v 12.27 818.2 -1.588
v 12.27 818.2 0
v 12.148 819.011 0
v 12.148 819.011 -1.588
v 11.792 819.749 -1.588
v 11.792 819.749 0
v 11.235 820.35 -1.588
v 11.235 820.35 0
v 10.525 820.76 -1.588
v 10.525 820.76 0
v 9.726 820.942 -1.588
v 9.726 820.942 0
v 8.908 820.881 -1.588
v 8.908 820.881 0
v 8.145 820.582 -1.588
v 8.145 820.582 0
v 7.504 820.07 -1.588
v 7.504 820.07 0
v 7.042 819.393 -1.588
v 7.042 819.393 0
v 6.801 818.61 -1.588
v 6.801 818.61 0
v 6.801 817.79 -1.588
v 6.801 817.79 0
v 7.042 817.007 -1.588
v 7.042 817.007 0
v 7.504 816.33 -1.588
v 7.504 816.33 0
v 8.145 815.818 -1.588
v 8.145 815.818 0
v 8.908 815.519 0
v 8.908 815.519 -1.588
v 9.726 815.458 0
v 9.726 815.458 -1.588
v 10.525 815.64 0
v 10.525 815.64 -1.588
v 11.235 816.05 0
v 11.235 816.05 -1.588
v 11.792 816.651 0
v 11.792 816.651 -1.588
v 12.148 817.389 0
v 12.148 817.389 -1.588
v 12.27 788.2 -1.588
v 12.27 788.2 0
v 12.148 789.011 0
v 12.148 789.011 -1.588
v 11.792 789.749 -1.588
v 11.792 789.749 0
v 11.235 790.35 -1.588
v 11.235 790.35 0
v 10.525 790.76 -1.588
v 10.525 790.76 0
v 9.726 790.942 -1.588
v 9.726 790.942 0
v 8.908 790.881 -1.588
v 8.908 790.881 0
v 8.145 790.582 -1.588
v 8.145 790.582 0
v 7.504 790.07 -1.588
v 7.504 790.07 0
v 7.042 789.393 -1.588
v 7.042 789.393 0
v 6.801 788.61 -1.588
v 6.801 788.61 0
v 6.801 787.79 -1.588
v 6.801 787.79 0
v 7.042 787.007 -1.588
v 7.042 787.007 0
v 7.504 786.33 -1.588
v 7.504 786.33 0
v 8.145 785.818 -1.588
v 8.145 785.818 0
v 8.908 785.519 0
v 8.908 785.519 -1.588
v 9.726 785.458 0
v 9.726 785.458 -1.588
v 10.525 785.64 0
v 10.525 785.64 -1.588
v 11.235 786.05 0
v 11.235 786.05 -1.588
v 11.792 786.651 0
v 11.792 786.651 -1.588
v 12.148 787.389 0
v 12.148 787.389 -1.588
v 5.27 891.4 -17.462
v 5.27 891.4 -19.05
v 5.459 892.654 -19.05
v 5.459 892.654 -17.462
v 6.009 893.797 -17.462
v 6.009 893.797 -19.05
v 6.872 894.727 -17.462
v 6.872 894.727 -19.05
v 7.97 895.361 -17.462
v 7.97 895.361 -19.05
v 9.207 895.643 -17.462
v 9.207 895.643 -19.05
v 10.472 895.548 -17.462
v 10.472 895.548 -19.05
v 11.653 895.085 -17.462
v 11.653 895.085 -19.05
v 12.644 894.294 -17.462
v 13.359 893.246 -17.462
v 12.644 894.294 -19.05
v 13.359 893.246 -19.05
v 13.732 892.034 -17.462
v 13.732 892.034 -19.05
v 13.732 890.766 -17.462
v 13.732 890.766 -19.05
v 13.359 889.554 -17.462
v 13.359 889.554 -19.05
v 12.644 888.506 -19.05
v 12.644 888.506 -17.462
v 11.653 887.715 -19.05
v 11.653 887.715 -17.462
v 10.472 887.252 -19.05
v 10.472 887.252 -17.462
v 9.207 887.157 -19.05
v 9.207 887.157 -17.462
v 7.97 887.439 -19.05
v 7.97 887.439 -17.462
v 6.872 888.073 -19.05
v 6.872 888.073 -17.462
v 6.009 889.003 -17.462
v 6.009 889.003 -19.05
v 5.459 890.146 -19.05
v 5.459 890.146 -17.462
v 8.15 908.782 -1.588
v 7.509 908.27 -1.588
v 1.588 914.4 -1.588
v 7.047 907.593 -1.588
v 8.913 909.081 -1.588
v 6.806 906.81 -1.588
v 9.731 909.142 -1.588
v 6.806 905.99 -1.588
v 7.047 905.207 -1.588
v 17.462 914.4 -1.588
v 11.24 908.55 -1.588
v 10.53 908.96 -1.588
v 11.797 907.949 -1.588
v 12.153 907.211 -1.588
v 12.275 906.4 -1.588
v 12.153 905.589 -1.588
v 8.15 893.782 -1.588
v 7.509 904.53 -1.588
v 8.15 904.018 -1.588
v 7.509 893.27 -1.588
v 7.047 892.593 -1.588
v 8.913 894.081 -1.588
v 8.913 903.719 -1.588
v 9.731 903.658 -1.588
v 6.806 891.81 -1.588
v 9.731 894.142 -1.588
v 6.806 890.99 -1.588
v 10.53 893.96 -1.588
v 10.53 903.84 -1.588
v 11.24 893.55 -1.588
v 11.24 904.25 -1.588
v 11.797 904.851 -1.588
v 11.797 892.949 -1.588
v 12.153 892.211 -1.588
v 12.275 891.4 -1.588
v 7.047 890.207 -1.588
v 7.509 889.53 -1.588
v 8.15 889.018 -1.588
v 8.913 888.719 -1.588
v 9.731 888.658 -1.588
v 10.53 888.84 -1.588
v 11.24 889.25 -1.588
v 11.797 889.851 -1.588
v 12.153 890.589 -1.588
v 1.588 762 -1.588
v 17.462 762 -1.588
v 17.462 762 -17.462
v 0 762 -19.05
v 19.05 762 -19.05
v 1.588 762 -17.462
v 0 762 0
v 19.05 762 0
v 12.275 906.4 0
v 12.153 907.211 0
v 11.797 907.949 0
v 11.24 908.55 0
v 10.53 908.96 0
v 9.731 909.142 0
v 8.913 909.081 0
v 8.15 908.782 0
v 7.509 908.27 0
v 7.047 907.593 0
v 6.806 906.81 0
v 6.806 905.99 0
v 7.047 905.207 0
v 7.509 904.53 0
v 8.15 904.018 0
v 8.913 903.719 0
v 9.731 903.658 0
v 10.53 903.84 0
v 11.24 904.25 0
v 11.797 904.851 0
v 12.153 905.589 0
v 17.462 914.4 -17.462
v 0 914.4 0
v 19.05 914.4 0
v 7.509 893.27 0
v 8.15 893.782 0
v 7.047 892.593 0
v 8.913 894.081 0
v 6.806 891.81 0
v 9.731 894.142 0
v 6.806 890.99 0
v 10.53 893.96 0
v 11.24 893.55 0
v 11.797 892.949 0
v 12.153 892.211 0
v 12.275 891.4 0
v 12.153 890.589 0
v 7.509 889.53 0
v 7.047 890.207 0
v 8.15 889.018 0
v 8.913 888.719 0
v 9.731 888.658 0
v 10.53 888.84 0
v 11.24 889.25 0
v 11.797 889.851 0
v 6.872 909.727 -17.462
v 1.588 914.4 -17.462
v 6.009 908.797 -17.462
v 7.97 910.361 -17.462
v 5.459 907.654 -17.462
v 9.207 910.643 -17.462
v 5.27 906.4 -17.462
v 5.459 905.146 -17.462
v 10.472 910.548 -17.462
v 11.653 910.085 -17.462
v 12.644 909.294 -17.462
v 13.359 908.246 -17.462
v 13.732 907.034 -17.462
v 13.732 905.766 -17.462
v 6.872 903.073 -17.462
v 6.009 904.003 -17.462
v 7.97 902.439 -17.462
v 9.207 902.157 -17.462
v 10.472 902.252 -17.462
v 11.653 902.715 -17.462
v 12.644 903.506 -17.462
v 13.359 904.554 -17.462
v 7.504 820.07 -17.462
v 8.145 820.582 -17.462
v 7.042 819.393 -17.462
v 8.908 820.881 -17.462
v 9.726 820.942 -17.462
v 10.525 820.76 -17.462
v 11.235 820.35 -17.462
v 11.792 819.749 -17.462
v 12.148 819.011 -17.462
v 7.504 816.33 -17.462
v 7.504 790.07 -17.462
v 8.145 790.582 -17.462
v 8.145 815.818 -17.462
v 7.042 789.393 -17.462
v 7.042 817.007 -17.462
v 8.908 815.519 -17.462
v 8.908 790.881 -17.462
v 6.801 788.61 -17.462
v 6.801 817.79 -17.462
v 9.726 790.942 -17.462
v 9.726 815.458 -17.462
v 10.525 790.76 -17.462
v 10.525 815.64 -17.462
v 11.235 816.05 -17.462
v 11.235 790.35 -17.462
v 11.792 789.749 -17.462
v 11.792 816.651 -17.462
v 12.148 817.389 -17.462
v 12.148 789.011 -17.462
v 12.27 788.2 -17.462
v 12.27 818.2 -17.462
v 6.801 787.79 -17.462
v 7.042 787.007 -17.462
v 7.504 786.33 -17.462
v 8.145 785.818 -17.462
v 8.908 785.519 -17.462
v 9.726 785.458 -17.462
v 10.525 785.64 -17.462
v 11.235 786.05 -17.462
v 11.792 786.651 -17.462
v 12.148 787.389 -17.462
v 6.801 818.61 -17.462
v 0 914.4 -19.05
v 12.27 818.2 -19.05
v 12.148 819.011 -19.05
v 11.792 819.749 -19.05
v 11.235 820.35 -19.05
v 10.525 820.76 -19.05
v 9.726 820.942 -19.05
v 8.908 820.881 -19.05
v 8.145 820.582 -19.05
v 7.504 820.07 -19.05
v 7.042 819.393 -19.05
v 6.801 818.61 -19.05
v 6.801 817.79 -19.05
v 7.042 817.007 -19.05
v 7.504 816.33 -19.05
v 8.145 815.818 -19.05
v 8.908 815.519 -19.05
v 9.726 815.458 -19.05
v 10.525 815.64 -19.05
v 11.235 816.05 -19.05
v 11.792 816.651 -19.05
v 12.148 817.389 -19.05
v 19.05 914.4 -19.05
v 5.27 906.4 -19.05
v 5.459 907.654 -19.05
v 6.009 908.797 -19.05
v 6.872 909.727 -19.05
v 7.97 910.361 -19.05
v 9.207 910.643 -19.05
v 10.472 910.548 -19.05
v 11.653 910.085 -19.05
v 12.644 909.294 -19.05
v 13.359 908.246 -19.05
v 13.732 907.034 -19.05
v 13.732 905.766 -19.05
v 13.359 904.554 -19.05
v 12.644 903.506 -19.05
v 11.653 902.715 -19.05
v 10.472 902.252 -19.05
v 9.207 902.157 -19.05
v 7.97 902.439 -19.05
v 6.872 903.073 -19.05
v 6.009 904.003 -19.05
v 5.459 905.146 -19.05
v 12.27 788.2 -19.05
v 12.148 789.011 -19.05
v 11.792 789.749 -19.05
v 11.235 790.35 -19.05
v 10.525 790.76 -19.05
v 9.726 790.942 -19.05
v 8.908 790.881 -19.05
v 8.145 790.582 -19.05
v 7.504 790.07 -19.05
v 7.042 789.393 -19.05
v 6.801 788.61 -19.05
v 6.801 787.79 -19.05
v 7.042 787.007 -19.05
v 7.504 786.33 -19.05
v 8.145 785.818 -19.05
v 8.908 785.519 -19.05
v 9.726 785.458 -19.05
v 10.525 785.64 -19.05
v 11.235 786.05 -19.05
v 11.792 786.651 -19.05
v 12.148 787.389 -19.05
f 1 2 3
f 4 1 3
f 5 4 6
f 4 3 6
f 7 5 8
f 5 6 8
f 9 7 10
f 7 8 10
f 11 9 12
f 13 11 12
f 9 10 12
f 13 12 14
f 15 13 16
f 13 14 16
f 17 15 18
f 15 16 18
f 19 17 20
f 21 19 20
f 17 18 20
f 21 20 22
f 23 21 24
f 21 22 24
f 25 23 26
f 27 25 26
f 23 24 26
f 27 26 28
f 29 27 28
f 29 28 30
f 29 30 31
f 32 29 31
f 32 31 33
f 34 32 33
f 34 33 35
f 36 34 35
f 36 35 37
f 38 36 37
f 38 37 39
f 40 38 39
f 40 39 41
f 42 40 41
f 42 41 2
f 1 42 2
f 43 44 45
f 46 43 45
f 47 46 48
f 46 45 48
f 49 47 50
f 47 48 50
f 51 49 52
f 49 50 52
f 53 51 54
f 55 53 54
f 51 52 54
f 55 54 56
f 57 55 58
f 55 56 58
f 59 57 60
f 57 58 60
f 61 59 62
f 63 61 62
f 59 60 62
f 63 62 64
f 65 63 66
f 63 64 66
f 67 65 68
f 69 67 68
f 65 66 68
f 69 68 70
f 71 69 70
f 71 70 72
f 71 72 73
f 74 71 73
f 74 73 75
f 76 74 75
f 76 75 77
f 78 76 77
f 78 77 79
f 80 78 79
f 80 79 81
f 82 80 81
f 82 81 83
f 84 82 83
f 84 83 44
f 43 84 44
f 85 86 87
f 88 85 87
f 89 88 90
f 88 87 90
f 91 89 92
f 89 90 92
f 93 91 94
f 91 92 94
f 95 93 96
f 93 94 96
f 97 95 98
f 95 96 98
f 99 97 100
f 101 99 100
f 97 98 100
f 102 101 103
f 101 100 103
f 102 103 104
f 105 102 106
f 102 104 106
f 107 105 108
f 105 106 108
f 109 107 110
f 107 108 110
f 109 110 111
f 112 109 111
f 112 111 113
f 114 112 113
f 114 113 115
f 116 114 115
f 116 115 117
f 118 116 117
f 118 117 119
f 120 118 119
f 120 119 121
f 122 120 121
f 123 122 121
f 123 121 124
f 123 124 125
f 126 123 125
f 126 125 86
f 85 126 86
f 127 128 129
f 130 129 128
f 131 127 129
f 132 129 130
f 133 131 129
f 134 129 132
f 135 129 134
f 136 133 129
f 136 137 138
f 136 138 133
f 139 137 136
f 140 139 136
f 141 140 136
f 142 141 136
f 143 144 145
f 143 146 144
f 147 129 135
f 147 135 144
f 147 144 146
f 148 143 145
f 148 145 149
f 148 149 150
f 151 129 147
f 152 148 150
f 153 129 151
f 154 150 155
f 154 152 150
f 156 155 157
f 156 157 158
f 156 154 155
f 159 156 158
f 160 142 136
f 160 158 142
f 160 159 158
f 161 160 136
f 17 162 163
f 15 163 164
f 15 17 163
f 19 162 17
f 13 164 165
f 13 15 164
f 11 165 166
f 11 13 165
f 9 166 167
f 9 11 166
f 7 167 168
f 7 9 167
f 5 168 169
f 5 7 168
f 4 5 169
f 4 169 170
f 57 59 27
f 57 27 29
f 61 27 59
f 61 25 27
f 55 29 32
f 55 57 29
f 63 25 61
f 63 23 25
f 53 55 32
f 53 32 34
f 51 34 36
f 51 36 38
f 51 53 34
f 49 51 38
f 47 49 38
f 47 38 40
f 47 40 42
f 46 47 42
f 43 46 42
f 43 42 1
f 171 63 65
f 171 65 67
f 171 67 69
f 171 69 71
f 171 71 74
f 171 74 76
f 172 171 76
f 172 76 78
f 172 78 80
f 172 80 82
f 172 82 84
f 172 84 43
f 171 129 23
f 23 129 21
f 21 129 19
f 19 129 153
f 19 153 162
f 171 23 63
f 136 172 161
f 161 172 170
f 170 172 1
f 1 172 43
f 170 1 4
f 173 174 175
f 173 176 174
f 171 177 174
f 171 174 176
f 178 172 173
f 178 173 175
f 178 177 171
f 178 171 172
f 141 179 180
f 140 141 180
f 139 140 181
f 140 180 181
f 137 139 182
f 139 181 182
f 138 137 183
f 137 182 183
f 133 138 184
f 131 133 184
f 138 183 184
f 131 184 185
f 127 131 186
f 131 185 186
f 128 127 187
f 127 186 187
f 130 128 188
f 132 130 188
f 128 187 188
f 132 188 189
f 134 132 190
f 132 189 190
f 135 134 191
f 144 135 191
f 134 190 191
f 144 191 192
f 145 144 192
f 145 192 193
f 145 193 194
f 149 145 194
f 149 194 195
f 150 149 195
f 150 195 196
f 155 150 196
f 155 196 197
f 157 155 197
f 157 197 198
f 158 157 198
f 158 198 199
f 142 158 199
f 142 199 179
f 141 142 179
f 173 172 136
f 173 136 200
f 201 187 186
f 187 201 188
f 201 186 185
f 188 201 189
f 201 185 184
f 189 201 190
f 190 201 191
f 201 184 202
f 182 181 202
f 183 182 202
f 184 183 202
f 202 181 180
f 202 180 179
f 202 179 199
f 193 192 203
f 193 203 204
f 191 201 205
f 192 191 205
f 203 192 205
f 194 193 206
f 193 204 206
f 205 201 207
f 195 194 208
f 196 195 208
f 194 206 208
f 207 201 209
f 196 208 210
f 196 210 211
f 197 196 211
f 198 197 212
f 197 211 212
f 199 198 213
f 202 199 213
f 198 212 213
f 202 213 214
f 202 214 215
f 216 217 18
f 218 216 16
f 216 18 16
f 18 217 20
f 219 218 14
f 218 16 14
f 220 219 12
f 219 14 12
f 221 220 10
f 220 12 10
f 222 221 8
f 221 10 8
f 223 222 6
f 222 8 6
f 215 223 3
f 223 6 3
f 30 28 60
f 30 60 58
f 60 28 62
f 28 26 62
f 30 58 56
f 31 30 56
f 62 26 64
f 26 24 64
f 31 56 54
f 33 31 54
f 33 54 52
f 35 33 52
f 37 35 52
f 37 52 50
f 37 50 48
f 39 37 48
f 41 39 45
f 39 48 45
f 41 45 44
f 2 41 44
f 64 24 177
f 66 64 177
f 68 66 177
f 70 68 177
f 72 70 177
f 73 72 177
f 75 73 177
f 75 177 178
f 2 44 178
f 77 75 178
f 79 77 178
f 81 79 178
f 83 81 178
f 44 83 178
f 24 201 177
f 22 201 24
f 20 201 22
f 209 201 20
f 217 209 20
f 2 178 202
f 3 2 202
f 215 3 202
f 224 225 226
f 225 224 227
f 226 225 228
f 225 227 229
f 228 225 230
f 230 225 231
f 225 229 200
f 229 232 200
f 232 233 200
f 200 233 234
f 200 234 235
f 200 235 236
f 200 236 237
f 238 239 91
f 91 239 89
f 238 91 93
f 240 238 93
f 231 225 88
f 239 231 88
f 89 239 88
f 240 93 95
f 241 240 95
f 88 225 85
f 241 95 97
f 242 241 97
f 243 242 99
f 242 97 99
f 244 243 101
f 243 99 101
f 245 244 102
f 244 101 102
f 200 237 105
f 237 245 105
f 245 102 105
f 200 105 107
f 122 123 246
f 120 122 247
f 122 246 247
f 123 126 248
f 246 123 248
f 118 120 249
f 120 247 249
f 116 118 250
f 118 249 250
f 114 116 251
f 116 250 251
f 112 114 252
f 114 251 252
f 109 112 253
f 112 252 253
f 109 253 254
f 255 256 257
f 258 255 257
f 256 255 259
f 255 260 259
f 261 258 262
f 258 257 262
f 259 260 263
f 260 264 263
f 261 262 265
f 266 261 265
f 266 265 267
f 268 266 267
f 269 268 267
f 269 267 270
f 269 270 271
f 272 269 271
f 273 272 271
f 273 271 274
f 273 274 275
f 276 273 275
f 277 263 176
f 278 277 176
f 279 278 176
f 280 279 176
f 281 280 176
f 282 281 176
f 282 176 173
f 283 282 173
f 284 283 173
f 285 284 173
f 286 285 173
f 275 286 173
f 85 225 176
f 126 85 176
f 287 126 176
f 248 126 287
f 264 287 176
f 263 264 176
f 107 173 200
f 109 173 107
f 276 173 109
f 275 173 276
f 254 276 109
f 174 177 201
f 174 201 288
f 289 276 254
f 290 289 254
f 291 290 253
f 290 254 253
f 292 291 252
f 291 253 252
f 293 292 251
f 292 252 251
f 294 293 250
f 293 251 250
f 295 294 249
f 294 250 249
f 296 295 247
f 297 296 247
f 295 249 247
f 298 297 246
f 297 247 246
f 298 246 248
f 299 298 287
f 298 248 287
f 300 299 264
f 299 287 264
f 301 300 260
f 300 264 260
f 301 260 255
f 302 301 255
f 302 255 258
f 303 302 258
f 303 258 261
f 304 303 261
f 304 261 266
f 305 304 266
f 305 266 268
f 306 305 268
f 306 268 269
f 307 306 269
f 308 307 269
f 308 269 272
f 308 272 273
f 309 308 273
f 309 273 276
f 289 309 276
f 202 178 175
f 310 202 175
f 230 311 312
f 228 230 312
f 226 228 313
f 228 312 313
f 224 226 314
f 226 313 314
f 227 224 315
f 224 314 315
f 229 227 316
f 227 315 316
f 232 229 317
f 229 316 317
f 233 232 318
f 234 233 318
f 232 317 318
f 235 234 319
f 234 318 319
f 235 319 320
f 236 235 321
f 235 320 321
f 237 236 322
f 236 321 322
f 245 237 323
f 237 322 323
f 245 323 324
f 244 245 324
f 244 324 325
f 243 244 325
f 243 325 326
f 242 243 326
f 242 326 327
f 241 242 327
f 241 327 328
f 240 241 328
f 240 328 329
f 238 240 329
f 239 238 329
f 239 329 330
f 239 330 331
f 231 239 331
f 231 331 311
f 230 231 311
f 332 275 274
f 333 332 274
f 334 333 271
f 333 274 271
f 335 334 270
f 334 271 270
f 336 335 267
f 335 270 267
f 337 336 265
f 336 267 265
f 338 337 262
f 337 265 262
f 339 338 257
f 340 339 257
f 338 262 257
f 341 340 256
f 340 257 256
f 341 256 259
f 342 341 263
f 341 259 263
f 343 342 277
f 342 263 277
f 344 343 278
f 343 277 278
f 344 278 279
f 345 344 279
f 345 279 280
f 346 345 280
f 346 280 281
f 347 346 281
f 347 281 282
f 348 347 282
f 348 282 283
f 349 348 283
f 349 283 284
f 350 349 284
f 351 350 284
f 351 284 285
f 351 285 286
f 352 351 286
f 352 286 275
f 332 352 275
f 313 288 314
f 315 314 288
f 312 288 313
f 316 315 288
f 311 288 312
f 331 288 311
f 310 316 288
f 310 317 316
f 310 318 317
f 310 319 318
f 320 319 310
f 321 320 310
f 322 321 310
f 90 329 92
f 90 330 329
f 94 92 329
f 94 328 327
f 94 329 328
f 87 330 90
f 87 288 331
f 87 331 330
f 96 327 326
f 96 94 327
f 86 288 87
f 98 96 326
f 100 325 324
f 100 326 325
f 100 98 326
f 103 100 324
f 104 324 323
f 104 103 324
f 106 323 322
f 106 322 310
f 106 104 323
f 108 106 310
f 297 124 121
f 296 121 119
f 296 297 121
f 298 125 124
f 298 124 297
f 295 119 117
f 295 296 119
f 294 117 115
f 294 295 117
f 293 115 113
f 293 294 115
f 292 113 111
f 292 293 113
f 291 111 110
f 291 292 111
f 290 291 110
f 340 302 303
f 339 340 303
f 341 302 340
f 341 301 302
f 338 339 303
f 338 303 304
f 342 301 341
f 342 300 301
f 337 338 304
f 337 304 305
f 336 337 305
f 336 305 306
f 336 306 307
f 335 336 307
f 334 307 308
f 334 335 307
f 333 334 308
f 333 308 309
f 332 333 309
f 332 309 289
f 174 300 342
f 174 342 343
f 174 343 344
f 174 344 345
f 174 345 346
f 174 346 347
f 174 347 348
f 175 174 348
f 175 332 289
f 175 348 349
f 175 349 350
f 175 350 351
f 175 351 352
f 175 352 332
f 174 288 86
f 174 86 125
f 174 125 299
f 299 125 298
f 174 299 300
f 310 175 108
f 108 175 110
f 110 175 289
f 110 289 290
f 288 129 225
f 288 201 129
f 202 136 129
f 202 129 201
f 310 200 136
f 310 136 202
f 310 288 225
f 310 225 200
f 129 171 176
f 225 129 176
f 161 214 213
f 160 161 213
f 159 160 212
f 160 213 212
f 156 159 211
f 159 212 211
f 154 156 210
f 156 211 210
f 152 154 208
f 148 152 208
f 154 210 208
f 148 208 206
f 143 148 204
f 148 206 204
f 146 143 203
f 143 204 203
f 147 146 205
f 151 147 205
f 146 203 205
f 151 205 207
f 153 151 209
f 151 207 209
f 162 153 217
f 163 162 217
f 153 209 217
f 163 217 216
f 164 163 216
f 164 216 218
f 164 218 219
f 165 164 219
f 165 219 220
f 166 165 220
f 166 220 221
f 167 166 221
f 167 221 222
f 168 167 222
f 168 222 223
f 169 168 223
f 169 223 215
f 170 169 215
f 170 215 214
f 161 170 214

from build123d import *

# Parameters (mm, degrees)
SKETCH1_W           = 19.05
SKETCH1_H           = 19.05
SKETCH1_W_2         = 15.875
SKETCH1_H_2         = 15.875
BOSS_EXTRUDE1_DEPTH = 914.4
SKETCH2_R           = 2.75
CUT_EXTRUDE1_DEPTH  = 20.05
CUT_EXTRUDE2_REACH  = 21.05
SKETCH3_R           = 4.255
SKETCH4_W           = 19.05
SKETCH4_H           = 762
CUT_EXTRUDE3_DEPTH  = 20.05
SKETCH5_R           = 2.75
CUT_EXTRUDE4_DEPTH  = 20.05


with BuildPart() as part:
    # Sketch1 → Boss-Extrude1 (new body)
    with BuildSketch(Plane(origin=(0, 0, 0), x_dir=(1, 0, 0), z_dir=(0, 1, 0))):
        with Locations((9.525, 9.525)):
            Rectangle(SKETCH1_W, SKETCH1_H)
        with Locations((9.525, 9.525)):
            Rectangle(SKETCH1_W_2, SKETCH1_H_2, mode=Mode.SUBTRACT)
    extrude(amount=BOSS_EXTRUDE1_DEPTH)

    # Sketch2 → Cut-Extrude1 (cut, through all)
    with BuildSketch(Plane.XY):
        with Locations((9.525, 906.4)):
            Circle(SKETCH2_R)
        with Locations((9.525, 891.4)):
            Circle(SKETCH2_R)
    extrude(amount=-CUT_EXTRUDE1_DEPTH, mode=Mode.SUBTRACT)

    # Sketch3 → Cut-Extrude2 (cut, up to next)
    with BuildSketch(Plane(origin=(0, 0, -19.05), x_dir=(-1, 0, 0), z_dir=(0, 0, -1)), mode=Mode.PRIVATE) as cut_extrude2_sk1:
        with Locations((-9.525, 906.4)):
            Circle(SKETCH3_R)
    cut_extrude2_tool1 = extrude(cut_extrude2_sk1.sketch, amount=-CUT_EXTRUDE2_REACH, mode=Mode.PRIVATE) & part.part
    add(cut_extrude2_tool1.solids().sort_by_distance((9.525, 906.4, -19.05))[0], mode=Mode.SUBTRACT)
    # Sketch3 → Cut-Extrude2 (cut, up to next)
    with BuildSketch(Plane(origin=(0, 0, -19.05), x_dir=(-1, 0, 0), z_dir=(0, 0, -1)), mode=Mode.PRIVATE) as cut_extrude2_sk2:
        with Locations((-9.525, 891.4)):
            Circle(SKETCH3_R)
    cut_extrude2_tool2 = extrude(cut_extrude2_sk2.sketch, amount=-CUT_EXTRUDE2_REACH, mode=Mode.PRIVATE) & part.part
    add(cut_extrude2_tool2.solids().sort_by_distance((9.525, 891.4, -19.05))[0], mode=Mode.SUBTRACT)

    # Sketch4 → Cut-Extrude3 (cut, through all)
    with BuildSketch(Plane.XY):
        with Locations((9.525, 381)):
            Rectangle(SKETCH4_W, SKETCH4_H)
    extrude(amount=-CUT_EXTRUDE3_DEPTH, mode=Mode.SUBTRACT)

    # Sketch5 → Cut-Extrude4 (cut, through all)
    with BuildSketch(Plane.XY):
        with Locations((9.52, 788.2)):
            Circle(SKETCH5_R)
        with Locations((9.52, 818.2)):
            Circle(SKETCH5_R)
    extrude(amount=-CUT_EXTRUDE4_DEPTH, mode=Mode.SUBTRACT)


solid = part.part
